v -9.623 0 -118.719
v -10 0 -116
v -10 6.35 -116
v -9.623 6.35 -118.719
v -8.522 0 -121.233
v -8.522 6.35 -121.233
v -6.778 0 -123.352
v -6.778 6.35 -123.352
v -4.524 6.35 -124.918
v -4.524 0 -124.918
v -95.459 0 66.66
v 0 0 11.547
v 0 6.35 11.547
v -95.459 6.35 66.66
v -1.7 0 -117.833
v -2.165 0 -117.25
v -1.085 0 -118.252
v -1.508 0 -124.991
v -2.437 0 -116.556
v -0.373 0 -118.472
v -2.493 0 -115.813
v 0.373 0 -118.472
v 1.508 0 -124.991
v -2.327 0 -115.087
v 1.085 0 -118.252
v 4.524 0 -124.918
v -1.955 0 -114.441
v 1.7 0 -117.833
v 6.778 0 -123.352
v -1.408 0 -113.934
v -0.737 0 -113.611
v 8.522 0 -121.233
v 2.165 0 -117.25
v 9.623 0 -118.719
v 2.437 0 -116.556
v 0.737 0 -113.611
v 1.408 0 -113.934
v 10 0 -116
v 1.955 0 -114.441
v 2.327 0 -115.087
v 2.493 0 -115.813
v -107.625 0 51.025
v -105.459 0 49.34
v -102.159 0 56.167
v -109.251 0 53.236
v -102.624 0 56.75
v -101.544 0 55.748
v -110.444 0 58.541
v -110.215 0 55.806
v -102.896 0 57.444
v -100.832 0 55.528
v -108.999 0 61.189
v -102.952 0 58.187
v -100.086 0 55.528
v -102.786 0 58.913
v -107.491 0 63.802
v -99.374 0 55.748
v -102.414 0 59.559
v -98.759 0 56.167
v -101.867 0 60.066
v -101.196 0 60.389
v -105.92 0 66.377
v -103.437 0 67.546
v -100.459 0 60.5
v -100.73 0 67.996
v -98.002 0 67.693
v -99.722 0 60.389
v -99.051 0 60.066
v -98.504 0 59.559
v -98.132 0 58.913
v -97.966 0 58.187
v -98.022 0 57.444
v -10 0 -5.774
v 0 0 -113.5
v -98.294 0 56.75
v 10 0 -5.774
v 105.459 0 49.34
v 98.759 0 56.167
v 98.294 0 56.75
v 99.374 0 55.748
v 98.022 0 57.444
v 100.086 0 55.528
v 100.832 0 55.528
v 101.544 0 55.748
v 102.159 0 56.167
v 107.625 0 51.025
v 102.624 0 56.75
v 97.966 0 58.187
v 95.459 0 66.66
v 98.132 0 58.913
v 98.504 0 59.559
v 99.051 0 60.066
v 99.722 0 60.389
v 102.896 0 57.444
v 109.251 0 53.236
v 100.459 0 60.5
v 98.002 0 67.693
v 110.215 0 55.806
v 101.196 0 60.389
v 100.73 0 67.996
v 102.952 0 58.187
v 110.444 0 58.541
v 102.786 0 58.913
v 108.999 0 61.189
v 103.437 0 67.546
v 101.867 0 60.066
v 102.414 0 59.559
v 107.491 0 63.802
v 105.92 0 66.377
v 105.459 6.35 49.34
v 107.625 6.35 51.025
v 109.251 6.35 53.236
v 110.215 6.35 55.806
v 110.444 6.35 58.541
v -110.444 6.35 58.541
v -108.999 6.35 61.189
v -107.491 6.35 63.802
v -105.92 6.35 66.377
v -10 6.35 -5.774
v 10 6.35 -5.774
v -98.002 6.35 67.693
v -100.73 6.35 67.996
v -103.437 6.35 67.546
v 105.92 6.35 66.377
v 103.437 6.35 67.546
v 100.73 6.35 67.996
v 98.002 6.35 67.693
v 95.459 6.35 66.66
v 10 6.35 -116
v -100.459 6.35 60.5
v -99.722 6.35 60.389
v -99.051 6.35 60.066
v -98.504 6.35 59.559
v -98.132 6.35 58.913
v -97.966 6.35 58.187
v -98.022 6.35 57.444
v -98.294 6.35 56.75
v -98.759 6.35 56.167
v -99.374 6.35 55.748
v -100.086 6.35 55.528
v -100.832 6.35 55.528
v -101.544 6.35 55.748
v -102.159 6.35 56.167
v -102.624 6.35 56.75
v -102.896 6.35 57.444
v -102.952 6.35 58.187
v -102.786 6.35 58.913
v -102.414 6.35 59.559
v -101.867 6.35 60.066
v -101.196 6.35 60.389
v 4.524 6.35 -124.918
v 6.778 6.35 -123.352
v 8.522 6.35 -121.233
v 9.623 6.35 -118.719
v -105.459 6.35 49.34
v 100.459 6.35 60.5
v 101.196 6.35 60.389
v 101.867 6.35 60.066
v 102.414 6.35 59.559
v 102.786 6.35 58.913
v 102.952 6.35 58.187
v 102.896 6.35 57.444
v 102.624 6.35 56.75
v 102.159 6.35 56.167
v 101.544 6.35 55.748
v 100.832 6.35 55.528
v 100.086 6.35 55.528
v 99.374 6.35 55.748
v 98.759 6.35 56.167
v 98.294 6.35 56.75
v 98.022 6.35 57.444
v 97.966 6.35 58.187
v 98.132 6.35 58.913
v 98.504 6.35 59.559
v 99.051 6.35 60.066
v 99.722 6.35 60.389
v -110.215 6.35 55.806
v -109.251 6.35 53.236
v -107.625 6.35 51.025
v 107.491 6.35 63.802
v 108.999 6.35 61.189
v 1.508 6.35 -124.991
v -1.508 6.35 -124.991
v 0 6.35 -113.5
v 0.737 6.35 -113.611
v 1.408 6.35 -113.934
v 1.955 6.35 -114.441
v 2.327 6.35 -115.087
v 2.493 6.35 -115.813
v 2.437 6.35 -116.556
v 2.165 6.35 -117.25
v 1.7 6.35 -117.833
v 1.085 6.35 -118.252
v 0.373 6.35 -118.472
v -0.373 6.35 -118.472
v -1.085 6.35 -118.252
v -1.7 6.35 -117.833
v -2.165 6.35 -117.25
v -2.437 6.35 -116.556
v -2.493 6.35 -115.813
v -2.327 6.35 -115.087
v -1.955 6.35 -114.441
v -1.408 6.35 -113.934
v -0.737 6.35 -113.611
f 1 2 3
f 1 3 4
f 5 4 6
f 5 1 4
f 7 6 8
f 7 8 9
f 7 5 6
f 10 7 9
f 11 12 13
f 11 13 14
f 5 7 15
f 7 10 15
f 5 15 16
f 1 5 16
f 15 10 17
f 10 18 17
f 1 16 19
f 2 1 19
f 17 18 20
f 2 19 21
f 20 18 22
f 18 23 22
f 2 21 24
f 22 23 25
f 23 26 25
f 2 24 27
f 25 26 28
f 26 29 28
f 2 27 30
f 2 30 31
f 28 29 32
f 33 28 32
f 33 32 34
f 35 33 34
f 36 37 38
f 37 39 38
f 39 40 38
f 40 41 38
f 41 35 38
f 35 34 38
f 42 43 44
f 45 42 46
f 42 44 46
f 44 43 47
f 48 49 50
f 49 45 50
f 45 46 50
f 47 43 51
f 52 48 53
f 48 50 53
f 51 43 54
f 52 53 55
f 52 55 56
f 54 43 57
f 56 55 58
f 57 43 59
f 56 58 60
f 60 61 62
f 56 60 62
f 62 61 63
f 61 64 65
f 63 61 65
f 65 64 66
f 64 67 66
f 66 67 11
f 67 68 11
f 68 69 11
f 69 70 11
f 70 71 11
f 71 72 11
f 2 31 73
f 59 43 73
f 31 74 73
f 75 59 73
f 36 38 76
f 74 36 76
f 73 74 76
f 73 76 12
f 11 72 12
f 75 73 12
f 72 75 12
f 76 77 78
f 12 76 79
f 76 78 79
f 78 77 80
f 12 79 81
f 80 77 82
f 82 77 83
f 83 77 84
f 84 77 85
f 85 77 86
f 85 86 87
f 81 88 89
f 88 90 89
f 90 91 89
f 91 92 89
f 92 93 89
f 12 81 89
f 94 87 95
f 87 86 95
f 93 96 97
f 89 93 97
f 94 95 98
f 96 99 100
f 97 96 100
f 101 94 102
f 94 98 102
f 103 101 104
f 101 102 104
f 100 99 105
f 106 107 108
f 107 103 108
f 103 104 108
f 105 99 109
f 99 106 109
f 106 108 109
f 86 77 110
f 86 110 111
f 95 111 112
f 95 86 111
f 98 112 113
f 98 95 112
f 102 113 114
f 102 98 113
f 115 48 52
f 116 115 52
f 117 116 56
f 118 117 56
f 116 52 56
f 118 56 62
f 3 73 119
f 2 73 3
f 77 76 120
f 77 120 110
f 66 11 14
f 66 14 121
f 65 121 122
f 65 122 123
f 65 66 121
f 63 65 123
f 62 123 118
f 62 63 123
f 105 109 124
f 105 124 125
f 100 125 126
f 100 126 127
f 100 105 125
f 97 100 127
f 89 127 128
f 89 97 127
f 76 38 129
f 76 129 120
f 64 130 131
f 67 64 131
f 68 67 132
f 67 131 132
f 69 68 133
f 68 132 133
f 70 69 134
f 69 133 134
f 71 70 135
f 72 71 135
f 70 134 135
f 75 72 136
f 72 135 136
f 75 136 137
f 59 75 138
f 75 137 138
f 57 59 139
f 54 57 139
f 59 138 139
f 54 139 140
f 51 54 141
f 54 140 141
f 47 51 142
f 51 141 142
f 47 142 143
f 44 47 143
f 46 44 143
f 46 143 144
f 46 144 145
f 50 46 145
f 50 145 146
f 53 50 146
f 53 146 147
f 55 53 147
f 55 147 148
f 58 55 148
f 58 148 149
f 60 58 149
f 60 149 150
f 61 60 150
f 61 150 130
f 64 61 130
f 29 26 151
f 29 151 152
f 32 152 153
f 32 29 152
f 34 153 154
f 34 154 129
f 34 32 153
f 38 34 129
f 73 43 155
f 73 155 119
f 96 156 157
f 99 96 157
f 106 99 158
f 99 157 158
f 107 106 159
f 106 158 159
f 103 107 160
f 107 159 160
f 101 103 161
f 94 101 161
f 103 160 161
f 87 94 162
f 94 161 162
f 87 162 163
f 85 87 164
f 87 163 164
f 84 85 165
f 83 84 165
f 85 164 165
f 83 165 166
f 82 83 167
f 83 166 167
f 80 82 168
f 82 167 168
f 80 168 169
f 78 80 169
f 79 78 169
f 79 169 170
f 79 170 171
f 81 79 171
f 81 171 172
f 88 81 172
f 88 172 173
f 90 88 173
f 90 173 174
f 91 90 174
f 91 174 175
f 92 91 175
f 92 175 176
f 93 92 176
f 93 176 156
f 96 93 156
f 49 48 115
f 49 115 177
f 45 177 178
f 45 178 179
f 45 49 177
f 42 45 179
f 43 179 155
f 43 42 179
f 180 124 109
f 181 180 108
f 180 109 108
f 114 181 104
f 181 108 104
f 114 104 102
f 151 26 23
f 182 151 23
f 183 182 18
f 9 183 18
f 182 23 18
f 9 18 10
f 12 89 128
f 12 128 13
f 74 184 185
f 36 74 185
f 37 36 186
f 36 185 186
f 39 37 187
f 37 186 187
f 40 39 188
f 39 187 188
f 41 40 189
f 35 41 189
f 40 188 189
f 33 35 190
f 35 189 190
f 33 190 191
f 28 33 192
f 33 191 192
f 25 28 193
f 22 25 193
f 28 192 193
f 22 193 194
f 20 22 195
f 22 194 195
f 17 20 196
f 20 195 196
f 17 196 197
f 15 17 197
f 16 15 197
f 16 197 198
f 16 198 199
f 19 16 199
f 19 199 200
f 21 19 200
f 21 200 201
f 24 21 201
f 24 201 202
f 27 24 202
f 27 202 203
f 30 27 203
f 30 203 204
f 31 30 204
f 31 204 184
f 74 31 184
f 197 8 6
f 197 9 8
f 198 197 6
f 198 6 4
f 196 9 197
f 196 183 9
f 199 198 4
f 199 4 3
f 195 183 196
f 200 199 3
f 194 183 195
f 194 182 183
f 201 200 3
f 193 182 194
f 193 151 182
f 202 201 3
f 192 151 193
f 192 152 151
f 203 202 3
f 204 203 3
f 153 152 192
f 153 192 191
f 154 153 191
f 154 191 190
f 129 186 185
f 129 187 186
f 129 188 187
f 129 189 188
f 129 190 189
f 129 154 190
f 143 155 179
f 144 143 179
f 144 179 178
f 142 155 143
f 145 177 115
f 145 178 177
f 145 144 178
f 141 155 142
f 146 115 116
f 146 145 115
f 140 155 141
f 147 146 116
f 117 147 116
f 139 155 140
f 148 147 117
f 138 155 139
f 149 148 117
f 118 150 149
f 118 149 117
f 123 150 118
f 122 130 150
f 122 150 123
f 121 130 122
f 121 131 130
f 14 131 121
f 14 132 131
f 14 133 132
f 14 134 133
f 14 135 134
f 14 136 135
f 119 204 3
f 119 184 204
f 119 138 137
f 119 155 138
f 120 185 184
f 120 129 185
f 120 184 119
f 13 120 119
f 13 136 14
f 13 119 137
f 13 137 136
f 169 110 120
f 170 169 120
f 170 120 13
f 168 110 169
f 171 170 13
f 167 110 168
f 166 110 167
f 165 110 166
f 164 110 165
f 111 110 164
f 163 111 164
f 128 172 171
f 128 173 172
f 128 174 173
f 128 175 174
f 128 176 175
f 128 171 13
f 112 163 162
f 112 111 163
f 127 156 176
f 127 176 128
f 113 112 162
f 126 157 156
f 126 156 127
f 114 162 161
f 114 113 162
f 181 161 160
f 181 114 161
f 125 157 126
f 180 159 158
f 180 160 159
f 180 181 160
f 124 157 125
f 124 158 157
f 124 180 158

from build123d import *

# Parameters (mm, degrees)
SKETCH1_R           = 125
BOSS_EXTRUDE1_DEPTH = 6.35
SKETCH2_R           = 2.5
CUT_EXTRUDE1_DEPTH  = 177.890707783
CUT_EXTRUDE2_START  = -10
CUT_EXTRUDE2_DEPTH  = 10


with BuildPart() as part:
    # Sketch1 → Boss-Extrude1 (new body)
    with BuildSketch(Plane(origin=(0, 0, 0), x_dir=(1, 0, 0), z_dir=(0, 1, 0))):
        with Locations(Location((0, 0, 0), (0, 0, 270))):
            Circle(SKETCH1_R)
    extrude(amount=BOSS_EXTRUDE1_DEPTH)

    # Sketch2 → Cut-Extrude1 (cut, through all)
    with BuildSketch(Plane(origin=(0, 6.35, 0), x_dir=(1, 0, 0), z_dir=(0, 1, 0))):
        with Locations(Location((0, 116, 0), (0, 0, 270))):
            Circle(SKETCH2_R)
        with Locations(Location((100.458946839, -58, 0), (0, 0, 270))):
            Circle(SKETCH2_R)
        with Locations(Location((-100.458946839, -58, 0), (0, 0, 270))):
            Circle(SKETCH2_R)
    extrude(amount=-CUT_EXTRUDE1_DEPTH, mode=Mode.SUBTRACT)

    # Sketch6 → Cut-Extrude2 (cut)
    with BuildSketch(Plane(origin=(0, 6.35, 0), x_dir=(1, 0, 0), z_dir=(0, 1, 0)).offset(CUT_EXTRUDE2_START)):
        with BuildLine():
            ThreePointArc((-10, 116), (-8.52176463, 121.232545039), (-4.524094482, 124.918103448))
            ThreePointArc((-4.524094482, 124.918103448), (-108.253175473, 62.5), (-110.44429822, -58.541070973))
            ThreePointArc((-110.44429822, -58.541070973), (-109.251346085, -53.236207865), (-105.458946839, -49.339745962))
            Line((-105.458946839, -49.339745962), (-10, 5.773502692))
            Line((-10, 5.773502692), (-10, 116))
        make_face()
        with BuildLine():
            ThreePointArc((4.524094482, 124.918103448), (8.52176463, 121.232545039), (10, 116))
            Line((10, 116), (10, 5.773502692))
            Line((10, 5.773502692), (105.458946839, -49.339745962))
            ThreePointArc((105.458946839, -49.339745962), (109.251346085, -53.236207865), (110.44429822, -58.541070973))
            ThreePointArc((110.44429822, -58.541070973), (121.306506993, -30.161753285), (125, 0))
            ThreePointArc((125, 0), (89.973640057, 86.774098064), (4.524094482, 124.918103448))
        make_face()
        with BuildLine():
            Line((95.458946839, -66.660254038), (0, -11.547005384))
            Line((0, -11.547005384), (-95.458946839, -66.660254038))
            ThreePointArc((-95.458946839, -66.660254038), (-100.729581454, -67.996337174), (-105.920203738, -66.377032475))
            ThreePointArc((-105.920203738, -66.377032475), (0, -125), (105.920203738, -66.377032475))
            ThreePointArc((105.920203738, -66.377032475), (100.729581454, -67.996337174), (95.458946839, -66.660254038))
        make_face()
    extrude(amount=CUT_EXTRUDE2_DEPTH, mode=Mode.SUBTRACT)


solid = part.part
